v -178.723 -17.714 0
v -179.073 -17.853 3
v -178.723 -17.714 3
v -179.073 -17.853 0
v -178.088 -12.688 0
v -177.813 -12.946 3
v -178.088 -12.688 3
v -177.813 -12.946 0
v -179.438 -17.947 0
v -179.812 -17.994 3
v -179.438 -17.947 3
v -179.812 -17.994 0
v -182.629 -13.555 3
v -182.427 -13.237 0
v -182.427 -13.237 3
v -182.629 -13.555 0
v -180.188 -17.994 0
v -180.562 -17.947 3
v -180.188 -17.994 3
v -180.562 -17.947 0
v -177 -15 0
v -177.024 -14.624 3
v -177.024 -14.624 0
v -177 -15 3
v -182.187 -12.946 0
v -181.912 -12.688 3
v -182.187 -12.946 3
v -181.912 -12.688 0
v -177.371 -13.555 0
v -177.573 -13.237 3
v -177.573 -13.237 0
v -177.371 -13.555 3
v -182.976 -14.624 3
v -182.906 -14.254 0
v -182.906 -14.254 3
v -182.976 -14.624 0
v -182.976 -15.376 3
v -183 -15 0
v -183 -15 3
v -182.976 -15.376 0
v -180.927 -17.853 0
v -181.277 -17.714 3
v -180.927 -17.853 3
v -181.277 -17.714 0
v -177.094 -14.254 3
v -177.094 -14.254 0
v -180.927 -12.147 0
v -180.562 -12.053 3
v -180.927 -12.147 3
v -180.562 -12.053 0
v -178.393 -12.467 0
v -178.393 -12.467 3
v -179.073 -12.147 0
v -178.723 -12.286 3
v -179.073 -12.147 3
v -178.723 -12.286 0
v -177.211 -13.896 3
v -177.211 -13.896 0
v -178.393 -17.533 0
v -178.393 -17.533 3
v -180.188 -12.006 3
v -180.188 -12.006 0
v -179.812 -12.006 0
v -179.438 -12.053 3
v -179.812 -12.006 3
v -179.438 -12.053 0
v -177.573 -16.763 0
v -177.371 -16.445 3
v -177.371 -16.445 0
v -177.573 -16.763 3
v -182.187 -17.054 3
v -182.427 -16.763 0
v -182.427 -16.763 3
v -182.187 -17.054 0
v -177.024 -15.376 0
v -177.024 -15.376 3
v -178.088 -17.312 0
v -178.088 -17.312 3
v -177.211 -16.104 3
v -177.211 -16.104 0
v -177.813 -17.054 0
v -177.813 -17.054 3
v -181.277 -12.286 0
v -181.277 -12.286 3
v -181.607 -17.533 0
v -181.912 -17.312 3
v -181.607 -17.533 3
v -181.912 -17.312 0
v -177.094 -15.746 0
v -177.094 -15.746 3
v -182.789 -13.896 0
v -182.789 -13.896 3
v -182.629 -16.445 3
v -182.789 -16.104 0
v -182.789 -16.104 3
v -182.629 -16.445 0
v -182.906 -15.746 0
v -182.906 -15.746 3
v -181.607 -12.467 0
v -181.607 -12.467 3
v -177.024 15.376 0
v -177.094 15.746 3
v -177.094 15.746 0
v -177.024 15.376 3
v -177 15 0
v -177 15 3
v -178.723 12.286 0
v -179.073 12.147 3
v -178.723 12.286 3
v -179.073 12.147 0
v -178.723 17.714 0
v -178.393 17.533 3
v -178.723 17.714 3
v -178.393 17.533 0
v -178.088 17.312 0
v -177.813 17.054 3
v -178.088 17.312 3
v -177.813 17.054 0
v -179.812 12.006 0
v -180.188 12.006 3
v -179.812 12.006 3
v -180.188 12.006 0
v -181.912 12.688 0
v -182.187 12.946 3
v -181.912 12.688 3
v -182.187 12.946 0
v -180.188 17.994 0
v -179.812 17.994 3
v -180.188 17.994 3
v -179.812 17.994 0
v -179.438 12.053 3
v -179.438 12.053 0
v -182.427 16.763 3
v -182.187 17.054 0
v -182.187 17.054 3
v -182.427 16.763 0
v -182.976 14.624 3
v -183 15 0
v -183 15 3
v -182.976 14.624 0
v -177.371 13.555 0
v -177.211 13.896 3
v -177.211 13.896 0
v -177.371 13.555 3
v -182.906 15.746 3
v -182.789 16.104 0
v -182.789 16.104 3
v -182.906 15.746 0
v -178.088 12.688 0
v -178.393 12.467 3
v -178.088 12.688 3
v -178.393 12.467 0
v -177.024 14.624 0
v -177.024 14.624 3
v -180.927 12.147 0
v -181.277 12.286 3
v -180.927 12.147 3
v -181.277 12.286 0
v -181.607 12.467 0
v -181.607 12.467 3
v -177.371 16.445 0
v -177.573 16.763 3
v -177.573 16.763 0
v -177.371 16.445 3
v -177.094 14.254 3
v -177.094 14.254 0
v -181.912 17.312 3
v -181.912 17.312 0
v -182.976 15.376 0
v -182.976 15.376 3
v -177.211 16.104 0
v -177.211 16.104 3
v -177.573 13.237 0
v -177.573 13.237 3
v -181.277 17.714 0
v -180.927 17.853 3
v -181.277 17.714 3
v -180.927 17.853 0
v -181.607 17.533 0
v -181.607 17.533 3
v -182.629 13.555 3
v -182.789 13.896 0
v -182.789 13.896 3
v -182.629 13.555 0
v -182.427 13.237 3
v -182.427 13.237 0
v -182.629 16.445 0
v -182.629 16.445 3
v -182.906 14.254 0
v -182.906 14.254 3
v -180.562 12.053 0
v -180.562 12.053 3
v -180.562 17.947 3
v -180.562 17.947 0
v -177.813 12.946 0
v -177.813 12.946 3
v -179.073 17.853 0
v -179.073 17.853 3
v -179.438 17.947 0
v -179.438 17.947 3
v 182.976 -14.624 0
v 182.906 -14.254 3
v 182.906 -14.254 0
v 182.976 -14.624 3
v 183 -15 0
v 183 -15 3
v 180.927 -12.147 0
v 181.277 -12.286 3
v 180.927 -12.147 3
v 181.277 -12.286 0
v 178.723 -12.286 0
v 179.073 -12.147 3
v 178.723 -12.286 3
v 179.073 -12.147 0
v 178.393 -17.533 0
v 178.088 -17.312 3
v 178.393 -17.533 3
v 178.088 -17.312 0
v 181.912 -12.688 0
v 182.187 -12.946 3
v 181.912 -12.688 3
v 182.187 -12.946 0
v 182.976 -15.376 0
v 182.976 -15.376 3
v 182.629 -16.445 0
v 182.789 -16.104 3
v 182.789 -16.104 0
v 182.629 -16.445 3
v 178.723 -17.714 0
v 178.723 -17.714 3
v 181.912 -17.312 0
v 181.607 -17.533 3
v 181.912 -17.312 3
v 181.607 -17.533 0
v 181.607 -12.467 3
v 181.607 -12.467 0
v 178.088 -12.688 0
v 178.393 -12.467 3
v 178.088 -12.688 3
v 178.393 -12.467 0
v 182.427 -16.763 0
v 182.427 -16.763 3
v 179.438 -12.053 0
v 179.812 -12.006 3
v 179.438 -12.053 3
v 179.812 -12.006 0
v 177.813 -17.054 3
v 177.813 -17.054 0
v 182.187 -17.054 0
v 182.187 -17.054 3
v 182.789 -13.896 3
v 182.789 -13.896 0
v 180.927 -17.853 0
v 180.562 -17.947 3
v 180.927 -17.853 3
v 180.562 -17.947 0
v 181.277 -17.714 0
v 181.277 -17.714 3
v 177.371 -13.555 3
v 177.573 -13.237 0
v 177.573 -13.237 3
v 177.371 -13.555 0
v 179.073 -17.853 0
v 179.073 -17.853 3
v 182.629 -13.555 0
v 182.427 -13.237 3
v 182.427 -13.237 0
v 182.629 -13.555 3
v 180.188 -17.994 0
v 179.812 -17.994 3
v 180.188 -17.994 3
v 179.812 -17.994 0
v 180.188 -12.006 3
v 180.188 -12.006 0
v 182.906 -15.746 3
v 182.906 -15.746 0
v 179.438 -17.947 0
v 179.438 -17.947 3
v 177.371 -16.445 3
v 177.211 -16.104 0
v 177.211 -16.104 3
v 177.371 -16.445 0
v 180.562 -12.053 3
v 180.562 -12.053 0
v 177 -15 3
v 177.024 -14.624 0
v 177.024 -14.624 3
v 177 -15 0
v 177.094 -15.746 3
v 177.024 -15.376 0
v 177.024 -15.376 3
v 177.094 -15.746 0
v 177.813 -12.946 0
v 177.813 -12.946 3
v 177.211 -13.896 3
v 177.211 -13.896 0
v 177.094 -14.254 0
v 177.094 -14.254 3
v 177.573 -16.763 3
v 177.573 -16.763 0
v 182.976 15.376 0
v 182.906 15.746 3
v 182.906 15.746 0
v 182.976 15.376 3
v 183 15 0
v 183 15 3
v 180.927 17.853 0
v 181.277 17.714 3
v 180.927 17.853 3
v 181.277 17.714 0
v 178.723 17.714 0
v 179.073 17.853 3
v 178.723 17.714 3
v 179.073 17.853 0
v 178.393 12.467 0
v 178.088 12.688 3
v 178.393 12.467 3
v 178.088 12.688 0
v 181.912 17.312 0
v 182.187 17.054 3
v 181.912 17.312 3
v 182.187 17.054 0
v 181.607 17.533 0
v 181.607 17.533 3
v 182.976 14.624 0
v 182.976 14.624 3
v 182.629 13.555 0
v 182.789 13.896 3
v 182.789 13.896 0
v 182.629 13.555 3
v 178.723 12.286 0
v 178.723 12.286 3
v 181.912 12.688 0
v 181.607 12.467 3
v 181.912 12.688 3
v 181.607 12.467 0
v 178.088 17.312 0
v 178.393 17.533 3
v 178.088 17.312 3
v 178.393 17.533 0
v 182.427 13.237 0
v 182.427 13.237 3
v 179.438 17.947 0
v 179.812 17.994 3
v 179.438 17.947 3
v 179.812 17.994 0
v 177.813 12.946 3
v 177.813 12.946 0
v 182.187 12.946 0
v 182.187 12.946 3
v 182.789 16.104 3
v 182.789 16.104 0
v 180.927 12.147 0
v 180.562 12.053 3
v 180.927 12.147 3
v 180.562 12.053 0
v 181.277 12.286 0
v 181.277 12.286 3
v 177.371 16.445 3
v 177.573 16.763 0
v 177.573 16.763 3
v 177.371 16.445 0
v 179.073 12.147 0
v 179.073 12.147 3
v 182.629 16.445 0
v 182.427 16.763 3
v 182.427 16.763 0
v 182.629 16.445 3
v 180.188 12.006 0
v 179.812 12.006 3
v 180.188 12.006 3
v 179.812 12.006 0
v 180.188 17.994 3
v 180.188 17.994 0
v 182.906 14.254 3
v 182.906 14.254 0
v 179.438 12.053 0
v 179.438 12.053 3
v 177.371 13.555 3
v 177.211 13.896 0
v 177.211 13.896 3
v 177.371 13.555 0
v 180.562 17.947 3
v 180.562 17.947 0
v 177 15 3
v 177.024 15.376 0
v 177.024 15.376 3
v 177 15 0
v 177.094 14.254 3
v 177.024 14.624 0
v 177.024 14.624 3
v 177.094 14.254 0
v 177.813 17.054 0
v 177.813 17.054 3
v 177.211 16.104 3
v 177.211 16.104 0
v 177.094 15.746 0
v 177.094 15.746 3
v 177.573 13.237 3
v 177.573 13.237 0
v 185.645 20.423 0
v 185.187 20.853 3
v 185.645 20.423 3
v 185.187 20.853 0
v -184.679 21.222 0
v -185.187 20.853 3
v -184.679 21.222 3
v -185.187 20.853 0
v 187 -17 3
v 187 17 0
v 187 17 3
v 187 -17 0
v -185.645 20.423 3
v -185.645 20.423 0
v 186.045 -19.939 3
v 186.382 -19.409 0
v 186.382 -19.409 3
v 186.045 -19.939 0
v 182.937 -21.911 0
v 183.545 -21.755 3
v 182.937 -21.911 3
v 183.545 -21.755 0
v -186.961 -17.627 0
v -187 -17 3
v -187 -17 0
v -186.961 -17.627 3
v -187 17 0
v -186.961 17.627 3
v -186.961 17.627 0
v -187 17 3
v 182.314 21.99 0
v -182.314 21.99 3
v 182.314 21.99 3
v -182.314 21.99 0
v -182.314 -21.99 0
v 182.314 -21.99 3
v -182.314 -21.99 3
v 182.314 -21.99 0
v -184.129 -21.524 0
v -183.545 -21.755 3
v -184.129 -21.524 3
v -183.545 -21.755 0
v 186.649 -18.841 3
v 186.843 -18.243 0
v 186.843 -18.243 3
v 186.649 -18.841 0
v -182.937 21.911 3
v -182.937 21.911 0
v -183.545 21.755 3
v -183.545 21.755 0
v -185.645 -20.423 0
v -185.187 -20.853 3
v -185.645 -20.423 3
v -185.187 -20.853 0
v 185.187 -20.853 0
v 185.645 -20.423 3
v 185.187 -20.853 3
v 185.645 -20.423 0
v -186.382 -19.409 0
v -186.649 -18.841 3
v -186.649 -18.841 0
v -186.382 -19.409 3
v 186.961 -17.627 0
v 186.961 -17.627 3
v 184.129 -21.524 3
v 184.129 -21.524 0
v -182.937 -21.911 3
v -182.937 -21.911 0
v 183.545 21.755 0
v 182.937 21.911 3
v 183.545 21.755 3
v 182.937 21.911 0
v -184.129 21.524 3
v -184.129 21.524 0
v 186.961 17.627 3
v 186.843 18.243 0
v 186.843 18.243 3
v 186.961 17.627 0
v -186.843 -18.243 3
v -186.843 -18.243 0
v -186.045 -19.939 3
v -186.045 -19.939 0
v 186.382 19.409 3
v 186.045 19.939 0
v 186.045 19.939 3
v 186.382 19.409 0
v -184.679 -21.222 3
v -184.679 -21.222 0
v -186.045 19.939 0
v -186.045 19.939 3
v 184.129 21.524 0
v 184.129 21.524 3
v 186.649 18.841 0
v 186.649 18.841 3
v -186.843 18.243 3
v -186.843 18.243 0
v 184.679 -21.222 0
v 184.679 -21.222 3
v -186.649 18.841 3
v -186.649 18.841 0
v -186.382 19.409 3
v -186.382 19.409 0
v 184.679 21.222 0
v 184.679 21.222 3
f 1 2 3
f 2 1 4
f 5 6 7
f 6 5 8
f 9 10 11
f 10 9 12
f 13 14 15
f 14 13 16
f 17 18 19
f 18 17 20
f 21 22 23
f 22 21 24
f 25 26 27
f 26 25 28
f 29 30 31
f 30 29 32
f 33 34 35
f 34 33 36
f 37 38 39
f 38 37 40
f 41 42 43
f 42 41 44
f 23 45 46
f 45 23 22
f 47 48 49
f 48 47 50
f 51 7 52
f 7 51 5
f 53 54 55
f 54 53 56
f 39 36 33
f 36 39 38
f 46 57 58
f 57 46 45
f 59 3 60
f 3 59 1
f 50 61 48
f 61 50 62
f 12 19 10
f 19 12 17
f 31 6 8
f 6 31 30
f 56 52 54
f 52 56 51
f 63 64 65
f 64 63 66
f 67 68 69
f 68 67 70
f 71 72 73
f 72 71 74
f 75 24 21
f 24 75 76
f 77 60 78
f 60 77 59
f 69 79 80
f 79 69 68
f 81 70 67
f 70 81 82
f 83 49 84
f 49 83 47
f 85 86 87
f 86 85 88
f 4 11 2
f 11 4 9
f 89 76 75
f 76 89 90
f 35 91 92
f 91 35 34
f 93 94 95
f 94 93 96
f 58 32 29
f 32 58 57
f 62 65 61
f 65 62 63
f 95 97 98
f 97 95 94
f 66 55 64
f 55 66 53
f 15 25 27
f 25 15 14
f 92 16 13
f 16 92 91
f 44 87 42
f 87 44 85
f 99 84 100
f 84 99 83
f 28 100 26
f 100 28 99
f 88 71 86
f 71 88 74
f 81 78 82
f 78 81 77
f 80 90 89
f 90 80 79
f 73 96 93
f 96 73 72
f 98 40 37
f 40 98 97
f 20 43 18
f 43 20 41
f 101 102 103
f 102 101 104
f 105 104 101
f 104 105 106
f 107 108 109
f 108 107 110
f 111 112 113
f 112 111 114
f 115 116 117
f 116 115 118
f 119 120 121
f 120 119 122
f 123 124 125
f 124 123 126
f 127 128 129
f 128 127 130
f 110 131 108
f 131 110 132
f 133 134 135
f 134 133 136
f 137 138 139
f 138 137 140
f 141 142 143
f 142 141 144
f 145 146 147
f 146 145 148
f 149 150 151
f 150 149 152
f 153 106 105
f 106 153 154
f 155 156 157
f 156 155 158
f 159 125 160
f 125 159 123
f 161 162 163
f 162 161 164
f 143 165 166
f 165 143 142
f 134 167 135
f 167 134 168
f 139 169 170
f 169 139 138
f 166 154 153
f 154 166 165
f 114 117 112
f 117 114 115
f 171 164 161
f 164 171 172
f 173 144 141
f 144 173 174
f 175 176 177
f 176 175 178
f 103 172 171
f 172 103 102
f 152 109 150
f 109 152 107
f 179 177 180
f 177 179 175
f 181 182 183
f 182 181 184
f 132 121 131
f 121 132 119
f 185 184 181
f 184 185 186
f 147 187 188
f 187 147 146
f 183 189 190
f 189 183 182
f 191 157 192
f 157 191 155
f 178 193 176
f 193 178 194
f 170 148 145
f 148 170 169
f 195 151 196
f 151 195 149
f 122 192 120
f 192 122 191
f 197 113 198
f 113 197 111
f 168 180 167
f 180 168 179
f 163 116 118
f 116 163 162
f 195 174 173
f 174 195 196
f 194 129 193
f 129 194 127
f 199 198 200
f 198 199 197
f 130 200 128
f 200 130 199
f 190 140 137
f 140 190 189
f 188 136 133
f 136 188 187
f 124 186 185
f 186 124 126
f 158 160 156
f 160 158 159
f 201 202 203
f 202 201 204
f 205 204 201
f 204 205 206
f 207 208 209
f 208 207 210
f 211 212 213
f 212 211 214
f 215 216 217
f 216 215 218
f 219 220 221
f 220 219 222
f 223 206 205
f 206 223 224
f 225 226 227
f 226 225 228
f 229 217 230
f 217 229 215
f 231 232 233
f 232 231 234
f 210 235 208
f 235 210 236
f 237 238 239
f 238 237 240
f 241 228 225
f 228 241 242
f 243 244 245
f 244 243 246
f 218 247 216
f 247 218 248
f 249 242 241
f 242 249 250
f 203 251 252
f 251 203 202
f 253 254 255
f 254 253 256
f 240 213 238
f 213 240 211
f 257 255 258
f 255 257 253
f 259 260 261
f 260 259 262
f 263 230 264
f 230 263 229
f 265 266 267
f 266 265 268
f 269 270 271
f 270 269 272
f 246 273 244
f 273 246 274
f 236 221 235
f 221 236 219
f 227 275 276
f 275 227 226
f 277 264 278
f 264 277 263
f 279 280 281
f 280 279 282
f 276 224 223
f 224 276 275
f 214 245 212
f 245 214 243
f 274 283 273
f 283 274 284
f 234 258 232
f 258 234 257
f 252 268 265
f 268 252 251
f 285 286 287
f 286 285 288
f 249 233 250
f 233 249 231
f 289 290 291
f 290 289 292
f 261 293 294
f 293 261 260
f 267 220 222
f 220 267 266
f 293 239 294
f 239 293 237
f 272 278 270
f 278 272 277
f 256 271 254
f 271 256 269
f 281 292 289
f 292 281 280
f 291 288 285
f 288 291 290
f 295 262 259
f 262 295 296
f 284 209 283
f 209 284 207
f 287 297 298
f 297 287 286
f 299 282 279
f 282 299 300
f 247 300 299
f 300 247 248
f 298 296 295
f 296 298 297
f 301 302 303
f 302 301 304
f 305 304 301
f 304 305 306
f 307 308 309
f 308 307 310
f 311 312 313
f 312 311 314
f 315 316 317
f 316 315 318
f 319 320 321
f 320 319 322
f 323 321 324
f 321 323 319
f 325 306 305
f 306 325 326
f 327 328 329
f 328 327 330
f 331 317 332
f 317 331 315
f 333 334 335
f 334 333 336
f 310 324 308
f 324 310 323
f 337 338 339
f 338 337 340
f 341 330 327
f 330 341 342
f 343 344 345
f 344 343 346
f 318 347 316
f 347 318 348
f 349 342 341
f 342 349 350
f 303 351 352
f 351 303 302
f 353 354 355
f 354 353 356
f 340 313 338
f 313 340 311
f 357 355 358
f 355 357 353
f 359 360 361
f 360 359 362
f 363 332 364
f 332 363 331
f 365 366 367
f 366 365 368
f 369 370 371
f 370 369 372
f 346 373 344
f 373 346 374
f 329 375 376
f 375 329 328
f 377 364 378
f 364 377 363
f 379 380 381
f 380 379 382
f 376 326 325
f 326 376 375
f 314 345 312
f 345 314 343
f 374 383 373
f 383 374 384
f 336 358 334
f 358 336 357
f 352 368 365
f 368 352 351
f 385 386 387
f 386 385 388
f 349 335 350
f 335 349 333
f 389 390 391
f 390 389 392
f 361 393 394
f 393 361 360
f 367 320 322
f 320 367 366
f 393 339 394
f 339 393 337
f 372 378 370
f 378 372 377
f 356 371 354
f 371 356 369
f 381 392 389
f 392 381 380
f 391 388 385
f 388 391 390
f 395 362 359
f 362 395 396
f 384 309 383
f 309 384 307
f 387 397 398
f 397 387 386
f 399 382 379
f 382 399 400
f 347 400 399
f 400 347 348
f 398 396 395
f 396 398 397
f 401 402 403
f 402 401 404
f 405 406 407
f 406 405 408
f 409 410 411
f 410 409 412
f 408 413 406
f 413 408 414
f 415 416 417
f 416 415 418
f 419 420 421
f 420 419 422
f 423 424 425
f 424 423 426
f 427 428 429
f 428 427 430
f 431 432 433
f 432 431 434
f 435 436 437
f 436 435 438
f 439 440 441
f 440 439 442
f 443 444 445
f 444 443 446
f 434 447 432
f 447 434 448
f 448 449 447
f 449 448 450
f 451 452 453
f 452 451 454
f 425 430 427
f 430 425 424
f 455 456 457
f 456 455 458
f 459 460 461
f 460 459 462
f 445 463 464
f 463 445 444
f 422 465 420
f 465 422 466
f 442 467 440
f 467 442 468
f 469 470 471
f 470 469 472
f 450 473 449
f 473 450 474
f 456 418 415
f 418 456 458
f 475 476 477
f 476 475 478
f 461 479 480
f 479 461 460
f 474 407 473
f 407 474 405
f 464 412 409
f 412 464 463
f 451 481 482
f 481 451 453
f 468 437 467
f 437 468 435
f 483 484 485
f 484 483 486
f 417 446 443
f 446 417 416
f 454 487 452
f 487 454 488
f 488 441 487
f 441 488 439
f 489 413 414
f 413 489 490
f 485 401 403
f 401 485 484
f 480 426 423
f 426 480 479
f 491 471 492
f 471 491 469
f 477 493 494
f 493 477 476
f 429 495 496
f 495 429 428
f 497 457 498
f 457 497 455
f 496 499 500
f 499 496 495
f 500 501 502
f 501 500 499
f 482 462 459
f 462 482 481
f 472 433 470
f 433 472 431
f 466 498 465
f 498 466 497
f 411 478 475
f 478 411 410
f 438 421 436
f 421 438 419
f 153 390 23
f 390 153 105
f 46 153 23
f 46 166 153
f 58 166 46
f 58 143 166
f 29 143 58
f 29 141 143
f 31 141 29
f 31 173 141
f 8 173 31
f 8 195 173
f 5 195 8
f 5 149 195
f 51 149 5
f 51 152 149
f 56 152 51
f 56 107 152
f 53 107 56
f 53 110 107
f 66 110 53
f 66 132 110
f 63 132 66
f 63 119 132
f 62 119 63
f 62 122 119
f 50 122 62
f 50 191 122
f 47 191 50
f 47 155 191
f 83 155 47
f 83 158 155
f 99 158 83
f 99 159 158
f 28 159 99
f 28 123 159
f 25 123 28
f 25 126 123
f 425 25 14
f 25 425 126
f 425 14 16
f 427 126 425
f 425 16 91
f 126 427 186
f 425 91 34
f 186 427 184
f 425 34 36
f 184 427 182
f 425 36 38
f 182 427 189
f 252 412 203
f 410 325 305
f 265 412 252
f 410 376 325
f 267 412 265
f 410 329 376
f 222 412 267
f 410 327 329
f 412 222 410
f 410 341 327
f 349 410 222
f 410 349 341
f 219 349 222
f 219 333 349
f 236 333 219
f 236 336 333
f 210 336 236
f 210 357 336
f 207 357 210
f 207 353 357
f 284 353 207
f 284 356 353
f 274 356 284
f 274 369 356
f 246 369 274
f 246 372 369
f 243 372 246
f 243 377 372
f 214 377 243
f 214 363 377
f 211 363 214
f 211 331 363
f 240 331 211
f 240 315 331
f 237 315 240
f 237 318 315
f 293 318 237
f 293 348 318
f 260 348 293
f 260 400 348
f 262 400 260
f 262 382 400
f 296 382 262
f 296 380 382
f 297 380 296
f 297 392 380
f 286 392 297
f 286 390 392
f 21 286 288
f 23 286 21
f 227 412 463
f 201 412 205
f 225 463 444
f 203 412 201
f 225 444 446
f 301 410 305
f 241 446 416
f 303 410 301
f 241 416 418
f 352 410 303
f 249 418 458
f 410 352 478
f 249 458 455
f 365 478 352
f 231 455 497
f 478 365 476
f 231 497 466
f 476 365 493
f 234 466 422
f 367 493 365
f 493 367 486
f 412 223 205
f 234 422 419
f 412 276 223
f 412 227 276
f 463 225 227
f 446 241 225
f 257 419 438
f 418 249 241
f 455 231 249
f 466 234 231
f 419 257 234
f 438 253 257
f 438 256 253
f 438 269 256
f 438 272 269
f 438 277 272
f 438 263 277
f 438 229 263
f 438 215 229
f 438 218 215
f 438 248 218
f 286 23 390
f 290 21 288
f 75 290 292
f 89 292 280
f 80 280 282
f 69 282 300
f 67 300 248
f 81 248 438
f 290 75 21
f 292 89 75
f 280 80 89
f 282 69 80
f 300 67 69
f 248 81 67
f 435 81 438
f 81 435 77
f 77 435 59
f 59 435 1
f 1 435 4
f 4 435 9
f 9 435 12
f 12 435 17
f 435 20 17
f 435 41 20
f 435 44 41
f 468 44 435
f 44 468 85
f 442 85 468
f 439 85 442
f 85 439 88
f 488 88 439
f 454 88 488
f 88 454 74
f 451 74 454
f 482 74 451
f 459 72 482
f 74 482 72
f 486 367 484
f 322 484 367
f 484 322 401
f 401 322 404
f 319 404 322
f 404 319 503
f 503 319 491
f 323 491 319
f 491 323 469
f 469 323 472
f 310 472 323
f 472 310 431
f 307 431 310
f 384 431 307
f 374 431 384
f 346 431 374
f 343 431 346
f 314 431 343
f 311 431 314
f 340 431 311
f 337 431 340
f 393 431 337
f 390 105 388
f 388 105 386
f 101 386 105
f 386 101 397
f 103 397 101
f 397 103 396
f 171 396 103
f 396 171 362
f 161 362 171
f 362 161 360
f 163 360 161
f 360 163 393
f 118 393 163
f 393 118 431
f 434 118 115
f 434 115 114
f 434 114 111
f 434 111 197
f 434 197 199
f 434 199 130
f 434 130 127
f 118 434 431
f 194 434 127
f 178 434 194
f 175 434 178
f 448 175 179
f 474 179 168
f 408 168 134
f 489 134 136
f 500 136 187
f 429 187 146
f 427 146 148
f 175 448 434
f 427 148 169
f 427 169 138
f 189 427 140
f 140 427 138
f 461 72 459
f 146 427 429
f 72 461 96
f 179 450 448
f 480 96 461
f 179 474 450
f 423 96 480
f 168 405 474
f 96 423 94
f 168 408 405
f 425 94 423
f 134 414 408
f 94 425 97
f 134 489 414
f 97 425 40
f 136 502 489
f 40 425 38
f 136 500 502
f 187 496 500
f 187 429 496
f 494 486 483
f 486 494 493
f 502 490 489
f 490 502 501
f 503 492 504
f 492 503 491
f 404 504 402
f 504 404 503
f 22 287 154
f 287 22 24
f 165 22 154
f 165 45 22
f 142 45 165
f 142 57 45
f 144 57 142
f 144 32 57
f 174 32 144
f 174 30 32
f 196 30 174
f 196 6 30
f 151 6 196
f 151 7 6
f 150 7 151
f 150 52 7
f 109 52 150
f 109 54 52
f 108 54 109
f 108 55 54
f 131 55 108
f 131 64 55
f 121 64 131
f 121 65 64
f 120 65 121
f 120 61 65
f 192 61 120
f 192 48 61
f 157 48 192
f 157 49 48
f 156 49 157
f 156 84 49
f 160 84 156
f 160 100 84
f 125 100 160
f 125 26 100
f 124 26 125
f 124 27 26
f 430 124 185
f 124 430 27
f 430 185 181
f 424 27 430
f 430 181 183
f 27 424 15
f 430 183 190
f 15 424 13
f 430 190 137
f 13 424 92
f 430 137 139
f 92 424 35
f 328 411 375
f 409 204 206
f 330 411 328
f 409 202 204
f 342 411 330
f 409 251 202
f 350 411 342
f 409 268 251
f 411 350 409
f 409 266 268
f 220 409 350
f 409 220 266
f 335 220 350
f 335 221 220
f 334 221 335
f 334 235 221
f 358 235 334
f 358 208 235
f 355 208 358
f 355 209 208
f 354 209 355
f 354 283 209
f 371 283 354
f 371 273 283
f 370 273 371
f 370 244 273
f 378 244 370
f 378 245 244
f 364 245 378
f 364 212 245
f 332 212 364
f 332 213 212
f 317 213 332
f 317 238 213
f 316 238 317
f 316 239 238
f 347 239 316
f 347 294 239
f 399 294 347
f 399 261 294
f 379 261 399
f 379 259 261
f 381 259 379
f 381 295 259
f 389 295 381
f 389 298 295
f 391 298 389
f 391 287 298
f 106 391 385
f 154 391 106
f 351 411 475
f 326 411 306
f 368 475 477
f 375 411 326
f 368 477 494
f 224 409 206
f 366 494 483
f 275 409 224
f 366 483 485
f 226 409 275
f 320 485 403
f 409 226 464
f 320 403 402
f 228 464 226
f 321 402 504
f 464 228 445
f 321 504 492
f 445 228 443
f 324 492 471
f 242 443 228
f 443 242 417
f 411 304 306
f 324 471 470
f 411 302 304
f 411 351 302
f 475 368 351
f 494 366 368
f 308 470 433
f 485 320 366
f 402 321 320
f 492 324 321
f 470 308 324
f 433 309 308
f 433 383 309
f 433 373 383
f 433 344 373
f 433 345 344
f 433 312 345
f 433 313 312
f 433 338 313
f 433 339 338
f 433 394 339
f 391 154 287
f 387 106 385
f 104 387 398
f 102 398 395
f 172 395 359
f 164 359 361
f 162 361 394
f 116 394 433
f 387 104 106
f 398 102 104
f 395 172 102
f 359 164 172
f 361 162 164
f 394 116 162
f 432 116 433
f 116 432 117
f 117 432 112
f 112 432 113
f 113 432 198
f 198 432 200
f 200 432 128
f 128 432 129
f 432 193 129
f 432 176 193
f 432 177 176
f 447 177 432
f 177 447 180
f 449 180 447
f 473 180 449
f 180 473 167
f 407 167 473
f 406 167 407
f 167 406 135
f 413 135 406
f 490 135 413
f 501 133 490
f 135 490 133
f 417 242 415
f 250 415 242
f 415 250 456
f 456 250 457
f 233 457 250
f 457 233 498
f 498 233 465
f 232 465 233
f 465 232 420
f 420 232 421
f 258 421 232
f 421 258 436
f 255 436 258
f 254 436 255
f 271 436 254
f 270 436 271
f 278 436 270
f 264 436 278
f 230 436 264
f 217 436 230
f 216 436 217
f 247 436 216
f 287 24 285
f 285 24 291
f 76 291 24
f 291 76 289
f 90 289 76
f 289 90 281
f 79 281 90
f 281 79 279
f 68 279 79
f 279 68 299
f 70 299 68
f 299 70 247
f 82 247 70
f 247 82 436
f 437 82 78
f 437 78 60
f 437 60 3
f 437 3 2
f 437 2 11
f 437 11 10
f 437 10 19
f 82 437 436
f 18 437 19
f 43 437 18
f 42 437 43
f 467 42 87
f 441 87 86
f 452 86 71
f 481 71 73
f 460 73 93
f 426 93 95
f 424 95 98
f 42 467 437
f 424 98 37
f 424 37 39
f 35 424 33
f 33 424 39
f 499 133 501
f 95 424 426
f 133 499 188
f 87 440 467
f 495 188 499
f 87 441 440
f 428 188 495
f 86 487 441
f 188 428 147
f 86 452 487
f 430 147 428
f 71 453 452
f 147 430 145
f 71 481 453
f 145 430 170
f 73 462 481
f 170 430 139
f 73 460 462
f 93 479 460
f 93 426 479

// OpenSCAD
$fn = 50;


difference() {
	union() {
		hull() {
			translate(v = [-182.0000000000, 17.0000000000, 0]) {
				cylinder(h = 3, r = 5);
			}
			translate(v = [182.0000000000, 17.0000000000, 0]) {
				cylinder(h = 3, r = 5);
			}
			translate(v = [-182.0000000000, -17.0000000000, 0]) {
				cylinder(h = 3, r = 5);
			}
			translate(v = [182.0000000000, -17.0000000000, 0]) {
				cylinder(h = 3, r = 5);
			}
		}
	}
	union() {
		translate(v = [-180.0000000000, -15.0000000000, -100.0000000000]) {
			cylinder(h = 200, r = 3.0000000000);
		}
		translate(v = [-180.0000000000, 15.0000000000, -100.0000000000]) {
			cylinder(h = 200, r = 3.0000000000);
		}
		translate(v = [180.0000000000, -15.0000000000, -100.0000000000]) {
			cylinder(h = 200, r = 3.0000000000);
		}
		translate(v = [180.0000000000, 15.0000000000, -100.0000000000]) {
			cylinder(h = 200, r = 3.0000000000);
		}
	}
}
